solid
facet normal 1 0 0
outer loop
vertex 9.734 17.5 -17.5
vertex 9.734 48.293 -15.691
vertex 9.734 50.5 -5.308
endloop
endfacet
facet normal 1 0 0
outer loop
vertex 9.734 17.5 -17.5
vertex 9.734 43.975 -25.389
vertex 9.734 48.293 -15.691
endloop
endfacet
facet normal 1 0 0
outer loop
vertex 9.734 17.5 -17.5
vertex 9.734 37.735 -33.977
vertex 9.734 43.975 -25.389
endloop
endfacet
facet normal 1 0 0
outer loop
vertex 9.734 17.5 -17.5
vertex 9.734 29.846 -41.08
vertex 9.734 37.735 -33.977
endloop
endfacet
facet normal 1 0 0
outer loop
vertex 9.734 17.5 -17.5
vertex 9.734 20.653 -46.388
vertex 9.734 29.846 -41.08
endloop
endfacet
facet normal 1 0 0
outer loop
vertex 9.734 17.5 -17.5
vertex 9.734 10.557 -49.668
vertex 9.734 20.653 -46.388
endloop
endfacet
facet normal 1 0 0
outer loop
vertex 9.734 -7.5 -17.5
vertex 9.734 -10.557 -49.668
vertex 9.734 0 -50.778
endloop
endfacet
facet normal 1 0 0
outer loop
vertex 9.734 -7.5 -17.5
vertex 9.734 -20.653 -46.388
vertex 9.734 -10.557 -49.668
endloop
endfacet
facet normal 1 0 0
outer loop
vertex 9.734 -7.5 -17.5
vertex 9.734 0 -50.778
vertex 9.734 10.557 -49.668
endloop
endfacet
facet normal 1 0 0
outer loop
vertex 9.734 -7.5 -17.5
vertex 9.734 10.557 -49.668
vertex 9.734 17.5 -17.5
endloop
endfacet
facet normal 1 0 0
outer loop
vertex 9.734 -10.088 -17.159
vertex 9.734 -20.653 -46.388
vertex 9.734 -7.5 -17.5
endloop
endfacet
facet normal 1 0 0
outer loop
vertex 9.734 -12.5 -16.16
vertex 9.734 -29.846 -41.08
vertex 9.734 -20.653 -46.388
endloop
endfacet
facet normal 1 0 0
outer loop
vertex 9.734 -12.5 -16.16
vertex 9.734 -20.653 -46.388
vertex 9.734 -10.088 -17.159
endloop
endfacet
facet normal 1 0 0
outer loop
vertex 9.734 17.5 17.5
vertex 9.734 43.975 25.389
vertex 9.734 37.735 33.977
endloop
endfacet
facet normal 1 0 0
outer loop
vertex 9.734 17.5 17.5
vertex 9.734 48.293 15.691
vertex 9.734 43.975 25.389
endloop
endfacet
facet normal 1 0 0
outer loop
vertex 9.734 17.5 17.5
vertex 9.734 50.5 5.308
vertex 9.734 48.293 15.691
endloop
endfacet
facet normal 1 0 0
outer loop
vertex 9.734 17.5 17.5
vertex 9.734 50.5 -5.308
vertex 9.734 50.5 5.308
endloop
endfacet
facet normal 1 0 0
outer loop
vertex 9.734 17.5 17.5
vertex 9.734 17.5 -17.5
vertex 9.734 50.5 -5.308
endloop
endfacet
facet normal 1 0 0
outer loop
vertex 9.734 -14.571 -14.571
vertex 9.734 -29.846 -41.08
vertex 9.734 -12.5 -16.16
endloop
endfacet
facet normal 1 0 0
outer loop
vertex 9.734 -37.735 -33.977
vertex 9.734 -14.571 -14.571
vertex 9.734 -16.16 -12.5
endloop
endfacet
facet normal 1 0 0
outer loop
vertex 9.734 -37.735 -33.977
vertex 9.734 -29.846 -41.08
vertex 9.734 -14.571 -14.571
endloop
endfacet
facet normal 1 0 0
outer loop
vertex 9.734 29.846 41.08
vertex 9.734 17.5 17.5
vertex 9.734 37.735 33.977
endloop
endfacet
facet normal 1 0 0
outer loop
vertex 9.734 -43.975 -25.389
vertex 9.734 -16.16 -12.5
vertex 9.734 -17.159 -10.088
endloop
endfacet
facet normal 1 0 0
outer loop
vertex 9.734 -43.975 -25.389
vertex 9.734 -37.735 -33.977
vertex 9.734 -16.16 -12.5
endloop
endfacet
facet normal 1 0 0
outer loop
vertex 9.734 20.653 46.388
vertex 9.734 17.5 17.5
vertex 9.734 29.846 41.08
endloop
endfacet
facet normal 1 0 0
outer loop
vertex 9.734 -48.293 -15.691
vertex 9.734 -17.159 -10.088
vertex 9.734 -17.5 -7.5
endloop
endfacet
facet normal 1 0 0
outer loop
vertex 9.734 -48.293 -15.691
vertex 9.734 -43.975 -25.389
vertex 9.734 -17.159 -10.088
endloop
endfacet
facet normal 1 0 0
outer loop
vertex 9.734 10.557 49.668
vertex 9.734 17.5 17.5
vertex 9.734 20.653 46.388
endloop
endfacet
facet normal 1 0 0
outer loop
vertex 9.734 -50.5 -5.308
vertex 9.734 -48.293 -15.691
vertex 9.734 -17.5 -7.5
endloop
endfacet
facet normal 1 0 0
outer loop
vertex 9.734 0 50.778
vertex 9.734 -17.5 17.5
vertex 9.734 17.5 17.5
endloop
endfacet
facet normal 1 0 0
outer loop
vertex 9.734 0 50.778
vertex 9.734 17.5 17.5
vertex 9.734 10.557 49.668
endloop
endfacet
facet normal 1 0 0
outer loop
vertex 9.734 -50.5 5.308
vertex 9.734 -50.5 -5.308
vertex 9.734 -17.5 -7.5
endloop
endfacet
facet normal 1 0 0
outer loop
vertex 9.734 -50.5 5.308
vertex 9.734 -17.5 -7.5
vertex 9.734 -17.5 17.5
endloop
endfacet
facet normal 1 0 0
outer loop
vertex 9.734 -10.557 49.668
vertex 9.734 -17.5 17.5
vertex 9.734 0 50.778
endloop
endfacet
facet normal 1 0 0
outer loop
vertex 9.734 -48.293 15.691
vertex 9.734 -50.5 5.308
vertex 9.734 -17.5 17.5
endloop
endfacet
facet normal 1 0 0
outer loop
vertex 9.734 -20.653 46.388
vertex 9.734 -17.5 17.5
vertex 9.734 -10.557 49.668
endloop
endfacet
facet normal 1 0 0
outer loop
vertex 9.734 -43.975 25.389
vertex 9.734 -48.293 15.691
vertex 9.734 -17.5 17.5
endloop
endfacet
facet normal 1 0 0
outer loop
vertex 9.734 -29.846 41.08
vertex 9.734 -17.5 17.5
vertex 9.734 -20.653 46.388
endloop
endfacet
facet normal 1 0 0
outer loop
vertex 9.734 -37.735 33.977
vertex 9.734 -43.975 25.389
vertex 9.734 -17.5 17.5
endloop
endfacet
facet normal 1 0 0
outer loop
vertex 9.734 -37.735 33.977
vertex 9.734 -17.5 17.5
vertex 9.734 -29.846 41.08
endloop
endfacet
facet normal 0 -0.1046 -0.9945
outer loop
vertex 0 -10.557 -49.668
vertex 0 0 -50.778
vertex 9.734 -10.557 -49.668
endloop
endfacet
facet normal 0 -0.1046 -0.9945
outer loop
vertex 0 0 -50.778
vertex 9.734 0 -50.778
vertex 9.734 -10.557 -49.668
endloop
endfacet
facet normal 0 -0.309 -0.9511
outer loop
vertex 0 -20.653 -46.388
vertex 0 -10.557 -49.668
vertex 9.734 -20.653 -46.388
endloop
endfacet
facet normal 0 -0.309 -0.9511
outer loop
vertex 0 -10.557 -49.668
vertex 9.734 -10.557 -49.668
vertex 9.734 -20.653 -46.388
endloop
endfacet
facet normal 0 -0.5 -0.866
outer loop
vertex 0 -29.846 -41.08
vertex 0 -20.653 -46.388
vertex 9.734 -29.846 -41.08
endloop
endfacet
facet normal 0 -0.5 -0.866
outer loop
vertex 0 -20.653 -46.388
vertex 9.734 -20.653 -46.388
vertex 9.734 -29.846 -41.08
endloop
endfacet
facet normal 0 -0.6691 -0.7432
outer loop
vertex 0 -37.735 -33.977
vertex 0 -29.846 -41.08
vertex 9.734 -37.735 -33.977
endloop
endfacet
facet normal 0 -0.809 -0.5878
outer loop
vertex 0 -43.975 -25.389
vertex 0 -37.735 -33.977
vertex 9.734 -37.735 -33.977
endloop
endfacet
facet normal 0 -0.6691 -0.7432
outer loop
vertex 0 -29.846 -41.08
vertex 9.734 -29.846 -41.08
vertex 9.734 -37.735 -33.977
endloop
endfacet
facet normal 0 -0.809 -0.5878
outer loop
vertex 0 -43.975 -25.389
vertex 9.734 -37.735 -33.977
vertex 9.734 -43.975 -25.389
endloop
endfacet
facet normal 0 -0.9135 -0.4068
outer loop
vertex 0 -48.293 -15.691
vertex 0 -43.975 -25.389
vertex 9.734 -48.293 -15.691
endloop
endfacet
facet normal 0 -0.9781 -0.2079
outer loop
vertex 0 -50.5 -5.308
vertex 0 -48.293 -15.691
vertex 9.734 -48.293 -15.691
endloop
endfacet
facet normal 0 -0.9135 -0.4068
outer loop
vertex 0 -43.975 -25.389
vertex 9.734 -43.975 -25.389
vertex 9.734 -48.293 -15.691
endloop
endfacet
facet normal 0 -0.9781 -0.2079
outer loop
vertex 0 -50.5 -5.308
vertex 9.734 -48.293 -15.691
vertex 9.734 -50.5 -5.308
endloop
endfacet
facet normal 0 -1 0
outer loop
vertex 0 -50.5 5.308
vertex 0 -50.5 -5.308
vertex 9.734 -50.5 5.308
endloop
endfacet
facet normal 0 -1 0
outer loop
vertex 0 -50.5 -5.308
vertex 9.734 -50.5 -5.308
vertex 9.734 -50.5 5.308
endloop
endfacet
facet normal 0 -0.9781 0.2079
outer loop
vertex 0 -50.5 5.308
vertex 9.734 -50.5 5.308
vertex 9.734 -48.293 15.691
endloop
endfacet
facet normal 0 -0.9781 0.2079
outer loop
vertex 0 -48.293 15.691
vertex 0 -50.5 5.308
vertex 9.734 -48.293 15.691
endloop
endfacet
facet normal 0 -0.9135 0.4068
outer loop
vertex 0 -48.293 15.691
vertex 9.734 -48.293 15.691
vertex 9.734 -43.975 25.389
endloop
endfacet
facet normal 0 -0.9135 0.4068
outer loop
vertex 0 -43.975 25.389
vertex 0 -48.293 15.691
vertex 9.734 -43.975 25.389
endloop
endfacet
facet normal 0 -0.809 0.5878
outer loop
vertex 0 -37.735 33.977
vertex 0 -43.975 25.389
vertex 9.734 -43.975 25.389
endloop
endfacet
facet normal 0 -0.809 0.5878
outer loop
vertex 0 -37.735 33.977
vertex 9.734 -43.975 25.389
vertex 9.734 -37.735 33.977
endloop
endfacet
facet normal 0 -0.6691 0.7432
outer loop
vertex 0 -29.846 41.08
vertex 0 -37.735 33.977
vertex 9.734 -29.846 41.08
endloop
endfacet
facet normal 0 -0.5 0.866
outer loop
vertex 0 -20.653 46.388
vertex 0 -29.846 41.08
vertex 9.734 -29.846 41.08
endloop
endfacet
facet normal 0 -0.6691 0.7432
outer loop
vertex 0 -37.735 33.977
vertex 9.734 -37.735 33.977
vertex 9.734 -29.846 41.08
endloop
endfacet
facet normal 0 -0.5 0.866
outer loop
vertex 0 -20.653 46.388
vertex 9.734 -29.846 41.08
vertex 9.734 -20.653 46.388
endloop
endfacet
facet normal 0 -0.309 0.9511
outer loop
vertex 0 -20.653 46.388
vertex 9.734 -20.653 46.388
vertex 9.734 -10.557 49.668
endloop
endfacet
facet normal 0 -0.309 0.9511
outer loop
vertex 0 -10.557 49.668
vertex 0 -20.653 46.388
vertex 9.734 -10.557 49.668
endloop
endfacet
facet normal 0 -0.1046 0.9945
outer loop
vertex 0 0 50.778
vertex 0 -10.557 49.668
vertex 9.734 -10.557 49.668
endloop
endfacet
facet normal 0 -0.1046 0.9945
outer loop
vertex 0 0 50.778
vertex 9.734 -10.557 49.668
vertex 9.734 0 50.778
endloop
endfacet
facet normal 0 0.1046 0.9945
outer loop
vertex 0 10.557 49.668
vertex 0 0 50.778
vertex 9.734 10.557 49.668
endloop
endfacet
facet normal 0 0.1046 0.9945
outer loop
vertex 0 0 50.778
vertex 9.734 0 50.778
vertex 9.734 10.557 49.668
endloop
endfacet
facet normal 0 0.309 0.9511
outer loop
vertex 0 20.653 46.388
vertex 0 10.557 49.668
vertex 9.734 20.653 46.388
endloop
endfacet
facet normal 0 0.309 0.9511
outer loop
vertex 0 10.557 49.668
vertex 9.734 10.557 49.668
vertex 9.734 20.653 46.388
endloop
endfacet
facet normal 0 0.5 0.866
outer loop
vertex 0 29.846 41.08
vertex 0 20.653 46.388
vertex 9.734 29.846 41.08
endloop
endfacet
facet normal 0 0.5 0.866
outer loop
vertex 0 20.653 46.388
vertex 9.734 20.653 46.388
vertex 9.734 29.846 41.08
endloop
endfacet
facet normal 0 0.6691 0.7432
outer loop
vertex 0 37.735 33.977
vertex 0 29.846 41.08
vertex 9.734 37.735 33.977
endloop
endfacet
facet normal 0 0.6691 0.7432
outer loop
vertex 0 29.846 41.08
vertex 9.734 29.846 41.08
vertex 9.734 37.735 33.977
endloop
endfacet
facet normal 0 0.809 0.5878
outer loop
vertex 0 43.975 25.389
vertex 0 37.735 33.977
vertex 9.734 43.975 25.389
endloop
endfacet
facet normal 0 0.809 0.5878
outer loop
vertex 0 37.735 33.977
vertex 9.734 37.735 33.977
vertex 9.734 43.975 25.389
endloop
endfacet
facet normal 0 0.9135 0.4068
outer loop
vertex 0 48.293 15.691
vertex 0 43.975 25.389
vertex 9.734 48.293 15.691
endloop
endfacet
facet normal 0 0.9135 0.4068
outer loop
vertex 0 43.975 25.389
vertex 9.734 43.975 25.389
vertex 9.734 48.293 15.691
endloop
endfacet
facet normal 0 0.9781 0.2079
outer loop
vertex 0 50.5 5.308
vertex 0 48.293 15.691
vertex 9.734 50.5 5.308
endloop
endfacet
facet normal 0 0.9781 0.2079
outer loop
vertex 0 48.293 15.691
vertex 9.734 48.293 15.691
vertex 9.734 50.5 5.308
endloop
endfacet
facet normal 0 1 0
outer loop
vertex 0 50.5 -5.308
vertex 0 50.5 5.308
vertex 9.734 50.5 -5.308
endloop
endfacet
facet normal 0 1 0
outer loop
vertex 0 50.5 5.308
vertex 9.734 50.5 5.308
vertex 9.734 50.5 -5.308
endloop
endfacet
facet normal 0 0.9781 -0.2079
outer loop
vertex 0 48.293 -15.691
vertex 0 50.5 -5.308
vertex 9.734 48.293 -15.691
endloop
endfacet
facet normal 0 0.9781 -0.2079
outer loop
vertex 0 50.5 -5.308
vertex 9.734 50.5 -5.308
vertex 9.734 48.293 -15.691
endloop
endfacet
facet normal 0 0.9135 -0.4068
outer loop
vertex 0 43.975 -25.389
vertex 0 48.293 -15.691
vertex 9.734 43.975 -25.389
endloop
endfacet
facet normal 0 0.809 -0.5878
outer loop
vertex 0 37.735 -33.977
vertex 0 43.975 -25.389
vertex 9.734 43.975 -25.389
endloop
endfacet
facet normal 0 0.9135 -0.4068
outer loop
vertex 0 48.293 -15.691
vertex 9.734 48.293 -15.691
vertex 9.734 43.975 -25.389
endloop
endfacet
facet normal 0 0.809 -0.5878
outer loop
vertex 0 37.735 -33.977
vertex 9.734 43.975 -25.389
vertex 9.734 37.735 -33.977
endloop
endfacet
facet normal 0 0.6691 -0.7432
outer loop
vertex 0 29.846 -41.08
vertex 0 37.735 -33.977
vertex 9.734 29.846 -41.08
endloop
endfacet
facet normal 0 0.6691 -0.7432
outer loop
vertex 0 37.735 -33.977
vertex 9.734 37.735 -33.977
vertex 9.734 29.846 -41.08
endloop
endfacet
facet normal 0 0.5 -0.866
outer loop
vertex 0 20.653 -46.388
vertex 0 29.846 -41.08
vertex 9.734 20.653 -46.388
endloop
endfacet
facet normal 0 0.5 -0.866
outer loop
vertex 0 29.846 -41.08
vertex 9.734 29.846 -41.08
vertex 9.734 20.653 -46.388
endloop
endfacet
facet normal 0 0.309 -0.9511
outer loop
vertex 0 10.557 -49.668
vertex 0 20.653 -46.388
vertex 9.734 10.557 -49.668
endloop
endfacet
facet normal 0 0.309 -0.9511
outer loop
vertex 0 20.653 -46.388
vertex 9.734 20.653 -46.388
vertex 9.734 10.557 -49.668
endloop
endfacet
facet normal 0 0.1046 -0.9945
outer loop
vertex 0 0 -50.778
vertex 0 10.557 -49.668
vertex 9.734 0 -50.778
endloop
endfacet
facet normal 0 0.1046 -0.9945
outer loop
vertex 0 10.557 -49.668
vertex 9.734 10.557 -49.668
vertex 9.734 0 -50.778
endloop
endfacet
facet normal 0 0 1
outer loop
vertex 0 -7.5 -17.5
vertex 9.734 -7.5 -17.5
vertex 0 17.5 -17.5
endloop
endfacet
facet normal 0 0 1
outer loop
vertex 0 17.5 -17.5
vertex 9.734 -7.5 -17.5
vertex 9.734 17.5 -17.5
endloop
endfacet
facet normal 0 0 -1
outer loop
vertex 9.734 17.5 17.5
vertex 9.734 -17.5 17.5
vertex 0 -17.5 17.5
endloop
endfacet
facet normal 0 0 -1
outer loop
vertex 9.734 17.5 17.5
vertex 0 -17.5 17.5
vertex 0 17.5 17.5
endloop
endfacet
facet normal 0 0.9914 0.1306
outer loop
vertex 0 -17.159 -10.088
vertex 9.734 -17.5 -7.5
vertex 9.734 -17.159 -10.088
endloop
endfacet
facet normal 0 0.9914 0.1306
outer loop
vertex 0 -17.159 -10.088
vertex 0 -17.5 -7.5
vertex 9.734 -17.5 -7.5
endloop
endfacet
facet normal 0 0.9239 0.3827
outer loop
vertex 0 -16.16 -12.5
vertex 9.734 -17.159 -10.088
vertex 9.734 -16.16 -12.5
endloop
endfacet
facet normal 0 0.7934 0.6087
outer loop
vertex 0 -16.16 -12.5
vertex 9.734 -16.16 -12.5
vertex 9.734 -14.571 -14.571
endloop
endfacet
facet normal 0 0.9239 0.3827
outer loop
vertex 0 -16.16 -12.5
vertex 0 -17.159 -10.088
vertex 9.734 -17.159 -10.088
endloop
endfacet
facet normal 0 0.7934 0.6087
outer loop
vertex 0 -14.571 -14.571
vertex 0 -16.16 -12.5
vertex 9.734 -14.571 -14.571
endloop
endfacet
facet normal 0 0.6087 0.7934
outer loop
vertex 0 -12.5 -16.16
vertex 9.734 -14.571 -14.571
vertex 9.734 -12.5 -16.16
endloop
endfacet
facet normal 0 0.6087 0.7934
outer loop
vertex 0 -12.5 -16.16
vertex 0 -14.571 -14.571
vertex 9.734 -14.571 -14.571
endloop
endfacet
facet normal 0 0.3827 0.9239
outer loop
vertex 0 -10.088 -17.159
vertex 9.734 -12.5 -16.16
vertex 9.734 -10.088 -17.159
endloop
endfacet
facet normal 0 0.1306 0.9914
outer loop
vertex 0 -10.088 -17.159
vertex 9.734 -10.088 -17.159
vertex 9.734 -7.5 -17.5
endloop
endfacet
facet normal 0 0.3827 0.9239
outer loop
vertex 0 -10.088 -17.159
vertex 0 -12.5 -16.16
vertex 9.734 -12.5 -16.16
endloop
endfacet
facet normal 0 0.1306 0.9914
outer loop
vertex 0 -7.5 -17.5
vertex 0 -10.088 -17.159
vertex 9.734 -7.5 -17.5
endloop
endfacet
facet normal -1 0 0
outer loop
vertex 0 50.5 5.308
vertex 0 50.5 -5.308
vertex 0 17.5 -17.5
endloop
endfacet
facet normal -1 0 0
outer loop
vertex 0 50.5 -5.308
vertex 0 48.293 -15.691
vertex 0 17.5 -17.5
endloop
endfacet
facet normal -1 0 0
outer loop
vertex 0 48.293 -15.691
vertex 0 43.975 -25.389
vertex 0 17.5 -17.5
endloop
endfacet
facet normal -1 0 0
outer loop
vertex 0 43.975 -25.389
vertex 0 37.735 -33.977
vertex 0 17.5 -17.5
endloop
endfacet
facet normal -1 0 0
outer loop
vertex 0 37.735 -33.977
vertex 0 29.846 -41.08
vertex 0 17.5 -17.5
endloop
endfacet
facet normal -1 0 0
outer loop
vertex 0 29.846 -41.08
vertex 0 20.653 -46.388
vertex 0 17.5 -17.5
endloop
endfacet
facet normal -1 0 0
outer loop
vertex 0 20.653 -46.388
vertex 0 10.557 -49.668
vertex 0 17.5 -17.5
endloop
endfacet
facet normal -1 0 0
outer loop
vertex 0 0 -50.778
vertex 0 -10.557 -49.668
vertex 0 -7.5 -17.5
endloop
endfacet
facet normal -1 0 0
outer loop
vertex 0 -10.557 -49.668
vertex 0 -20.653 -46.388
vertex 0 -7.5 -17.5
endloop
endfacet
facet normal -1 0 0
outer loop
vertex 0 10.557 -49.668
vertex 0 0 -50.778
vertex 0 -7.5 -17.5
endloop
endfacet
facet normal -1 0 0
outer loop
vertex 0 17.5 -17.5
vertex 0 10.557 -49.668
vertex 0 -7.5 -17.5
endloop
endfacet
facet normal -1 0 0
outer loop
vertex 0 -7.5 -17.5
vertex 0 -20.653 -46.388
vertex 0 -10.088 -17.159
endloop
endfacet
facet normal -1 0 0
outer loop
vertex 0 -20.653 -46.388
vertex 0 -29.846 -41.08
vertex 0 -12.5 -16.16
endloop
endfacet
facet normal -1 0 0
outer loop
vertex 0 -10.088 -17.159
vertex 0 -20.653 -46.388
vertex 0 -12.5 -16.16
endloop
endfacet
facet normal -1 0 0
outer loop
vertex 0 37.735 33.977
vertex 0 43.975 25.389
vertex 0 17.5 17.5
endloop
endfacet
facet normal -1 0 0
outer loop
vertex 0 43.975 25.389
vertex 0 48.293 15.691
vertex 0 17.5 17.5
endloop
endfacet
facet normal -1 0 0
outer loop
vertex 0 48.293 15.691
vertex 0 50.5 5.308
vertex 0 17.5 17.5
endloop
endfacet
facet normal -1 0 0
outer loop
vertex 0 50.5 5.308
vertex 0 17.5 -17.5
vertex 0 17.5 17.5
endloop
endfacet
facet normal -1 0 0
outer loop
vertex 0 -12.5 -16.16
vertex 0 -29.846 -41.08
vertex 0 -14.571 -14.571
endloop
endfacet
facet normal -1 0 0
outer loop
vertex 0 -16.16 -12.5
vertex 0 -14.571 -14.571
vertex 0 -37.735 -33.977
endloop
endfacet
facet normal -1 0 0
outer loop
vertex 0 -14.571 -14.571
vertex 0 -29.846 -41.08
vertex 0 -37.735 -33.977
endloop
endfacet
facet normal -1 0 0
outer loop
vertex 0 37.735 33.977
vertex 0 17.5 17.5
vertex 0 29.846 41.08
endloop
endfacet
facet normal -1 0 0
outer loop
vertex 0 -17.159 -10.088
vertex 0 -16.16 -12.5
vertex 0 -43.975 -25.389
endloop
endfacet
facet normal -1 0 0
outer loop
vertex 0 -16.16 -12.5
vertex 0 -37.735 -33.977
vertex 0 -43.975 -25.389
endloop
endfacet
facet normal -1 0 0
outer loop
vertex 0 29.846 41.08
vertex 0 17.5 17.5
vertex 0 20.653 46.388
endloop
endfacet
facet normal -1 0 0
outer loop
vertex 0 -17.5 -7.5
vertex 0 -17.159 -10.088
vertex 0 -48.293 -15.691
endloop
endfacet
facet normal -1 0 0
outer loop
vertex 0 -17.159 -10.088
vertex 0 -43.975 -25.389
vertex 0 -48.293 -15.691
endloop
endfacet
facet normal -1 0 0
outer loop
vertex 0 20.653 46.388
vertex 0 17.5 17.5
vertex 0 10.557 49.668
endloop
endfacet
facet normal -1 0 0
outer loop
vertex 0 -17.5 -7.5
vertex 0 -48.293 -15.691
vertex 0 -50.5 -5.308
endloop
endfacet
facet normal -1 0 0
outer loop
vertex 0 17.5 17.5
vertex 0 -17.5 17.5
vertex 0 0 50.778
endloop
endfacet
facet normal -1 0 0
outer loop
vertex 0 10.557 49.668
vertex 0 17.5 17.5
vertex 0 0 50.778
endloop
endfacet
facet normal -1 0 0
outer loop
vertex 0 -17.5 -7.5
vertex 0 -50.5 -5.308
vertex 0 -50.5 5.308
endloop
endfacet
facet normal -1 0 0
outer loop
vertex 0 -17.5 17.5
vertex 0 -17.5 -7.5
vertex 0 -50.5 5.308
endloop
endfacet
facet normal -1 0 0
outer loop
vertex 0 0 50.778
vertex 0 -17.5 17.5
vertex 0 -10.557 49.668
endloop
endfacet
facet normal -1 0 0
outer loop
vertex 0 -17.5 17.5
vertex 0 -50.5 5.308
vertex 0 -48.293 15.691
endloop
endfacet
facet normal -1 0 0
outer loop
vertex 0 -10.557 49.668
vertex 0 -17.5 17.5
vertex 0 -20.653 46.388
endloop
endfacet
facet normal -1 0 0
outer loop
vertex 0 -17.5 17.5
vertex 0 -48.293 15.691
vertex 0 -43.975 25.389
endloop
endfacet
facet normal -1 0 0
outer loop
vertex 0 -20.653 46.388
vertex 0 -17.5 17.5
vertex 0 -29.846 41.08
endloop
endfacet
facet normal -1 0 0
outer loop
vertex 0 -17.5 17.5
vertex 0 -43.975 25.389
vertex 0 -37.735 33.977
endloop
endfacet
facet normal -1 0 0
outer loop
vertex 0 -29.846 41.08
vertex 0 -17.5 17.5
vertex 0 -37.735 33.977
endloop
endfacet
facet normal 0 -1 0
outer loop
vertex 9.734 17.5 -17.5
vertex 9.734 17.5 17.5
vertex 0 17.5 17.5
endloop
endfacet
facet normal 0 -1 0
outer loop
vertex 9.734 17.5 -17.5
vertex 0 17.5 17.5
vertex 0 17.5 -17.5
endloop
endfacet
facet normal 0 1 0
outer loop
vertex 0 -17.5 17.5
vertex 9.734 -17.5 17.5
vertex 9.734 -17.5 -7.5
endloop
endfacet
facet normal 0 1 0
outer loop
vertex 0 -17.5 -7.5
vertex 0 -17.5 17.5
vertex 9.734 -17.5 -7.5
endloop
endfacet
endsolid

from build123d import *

# Parameters (mm, degrees)
ESQUISSE1_W             = 9.734075662
ESQUISSE1_H             = 50.777874564
ESQUISSE2_W             = 35
ESQUISSE2_H             = 35
ENL_V_MAT_EXTRU_1_DEPTH = 10.734075662
CONG_2_R                = 10


with BuildPart() as part:
    # Esquisse1 → Révolution1 (revolve)
    with BuildSketch(Plane.XY, mode=Mode.PRIVATE) as r_volution1_sk:
        with Locations((4.867037831, 25.388937282)):
            Rectangle(ESQUISSE1_W, ESQUISSE1_H)
    revolve(r_volution1_sk.sketch.rotate(Axis((9.734075662, 0, 0), (-1, 0, 0)), 90), axis=Axis((9.734075662, 0, 0), (-1, 0, 0)))  # turned: the seam where the file's is

    # Esquisse2 → Enlèv. mat.-Extru.1 (cut, through all)
    with BuildSketch(Plane(origin=(9.734075662, 0, 0), x_dir=(0, 0, -1), z_dir=(1, 0, 0))):
        Rectangle(ESQUISSE2_W, ESQUISSE2_H)
    extrude(amount=-ENL_V_MAT_EXTRU_1_DEPTH, mode=Mode.SUBTRACT)

    # Congé2
    cong_2_edges = [part.edges().sort_by_distance(p)[0] for p in [
        (4.867037831, -17.5, -17.5),
    ]]
    fillet(cong_2_edges, radius=CONG_2_R)


solid = part.part
